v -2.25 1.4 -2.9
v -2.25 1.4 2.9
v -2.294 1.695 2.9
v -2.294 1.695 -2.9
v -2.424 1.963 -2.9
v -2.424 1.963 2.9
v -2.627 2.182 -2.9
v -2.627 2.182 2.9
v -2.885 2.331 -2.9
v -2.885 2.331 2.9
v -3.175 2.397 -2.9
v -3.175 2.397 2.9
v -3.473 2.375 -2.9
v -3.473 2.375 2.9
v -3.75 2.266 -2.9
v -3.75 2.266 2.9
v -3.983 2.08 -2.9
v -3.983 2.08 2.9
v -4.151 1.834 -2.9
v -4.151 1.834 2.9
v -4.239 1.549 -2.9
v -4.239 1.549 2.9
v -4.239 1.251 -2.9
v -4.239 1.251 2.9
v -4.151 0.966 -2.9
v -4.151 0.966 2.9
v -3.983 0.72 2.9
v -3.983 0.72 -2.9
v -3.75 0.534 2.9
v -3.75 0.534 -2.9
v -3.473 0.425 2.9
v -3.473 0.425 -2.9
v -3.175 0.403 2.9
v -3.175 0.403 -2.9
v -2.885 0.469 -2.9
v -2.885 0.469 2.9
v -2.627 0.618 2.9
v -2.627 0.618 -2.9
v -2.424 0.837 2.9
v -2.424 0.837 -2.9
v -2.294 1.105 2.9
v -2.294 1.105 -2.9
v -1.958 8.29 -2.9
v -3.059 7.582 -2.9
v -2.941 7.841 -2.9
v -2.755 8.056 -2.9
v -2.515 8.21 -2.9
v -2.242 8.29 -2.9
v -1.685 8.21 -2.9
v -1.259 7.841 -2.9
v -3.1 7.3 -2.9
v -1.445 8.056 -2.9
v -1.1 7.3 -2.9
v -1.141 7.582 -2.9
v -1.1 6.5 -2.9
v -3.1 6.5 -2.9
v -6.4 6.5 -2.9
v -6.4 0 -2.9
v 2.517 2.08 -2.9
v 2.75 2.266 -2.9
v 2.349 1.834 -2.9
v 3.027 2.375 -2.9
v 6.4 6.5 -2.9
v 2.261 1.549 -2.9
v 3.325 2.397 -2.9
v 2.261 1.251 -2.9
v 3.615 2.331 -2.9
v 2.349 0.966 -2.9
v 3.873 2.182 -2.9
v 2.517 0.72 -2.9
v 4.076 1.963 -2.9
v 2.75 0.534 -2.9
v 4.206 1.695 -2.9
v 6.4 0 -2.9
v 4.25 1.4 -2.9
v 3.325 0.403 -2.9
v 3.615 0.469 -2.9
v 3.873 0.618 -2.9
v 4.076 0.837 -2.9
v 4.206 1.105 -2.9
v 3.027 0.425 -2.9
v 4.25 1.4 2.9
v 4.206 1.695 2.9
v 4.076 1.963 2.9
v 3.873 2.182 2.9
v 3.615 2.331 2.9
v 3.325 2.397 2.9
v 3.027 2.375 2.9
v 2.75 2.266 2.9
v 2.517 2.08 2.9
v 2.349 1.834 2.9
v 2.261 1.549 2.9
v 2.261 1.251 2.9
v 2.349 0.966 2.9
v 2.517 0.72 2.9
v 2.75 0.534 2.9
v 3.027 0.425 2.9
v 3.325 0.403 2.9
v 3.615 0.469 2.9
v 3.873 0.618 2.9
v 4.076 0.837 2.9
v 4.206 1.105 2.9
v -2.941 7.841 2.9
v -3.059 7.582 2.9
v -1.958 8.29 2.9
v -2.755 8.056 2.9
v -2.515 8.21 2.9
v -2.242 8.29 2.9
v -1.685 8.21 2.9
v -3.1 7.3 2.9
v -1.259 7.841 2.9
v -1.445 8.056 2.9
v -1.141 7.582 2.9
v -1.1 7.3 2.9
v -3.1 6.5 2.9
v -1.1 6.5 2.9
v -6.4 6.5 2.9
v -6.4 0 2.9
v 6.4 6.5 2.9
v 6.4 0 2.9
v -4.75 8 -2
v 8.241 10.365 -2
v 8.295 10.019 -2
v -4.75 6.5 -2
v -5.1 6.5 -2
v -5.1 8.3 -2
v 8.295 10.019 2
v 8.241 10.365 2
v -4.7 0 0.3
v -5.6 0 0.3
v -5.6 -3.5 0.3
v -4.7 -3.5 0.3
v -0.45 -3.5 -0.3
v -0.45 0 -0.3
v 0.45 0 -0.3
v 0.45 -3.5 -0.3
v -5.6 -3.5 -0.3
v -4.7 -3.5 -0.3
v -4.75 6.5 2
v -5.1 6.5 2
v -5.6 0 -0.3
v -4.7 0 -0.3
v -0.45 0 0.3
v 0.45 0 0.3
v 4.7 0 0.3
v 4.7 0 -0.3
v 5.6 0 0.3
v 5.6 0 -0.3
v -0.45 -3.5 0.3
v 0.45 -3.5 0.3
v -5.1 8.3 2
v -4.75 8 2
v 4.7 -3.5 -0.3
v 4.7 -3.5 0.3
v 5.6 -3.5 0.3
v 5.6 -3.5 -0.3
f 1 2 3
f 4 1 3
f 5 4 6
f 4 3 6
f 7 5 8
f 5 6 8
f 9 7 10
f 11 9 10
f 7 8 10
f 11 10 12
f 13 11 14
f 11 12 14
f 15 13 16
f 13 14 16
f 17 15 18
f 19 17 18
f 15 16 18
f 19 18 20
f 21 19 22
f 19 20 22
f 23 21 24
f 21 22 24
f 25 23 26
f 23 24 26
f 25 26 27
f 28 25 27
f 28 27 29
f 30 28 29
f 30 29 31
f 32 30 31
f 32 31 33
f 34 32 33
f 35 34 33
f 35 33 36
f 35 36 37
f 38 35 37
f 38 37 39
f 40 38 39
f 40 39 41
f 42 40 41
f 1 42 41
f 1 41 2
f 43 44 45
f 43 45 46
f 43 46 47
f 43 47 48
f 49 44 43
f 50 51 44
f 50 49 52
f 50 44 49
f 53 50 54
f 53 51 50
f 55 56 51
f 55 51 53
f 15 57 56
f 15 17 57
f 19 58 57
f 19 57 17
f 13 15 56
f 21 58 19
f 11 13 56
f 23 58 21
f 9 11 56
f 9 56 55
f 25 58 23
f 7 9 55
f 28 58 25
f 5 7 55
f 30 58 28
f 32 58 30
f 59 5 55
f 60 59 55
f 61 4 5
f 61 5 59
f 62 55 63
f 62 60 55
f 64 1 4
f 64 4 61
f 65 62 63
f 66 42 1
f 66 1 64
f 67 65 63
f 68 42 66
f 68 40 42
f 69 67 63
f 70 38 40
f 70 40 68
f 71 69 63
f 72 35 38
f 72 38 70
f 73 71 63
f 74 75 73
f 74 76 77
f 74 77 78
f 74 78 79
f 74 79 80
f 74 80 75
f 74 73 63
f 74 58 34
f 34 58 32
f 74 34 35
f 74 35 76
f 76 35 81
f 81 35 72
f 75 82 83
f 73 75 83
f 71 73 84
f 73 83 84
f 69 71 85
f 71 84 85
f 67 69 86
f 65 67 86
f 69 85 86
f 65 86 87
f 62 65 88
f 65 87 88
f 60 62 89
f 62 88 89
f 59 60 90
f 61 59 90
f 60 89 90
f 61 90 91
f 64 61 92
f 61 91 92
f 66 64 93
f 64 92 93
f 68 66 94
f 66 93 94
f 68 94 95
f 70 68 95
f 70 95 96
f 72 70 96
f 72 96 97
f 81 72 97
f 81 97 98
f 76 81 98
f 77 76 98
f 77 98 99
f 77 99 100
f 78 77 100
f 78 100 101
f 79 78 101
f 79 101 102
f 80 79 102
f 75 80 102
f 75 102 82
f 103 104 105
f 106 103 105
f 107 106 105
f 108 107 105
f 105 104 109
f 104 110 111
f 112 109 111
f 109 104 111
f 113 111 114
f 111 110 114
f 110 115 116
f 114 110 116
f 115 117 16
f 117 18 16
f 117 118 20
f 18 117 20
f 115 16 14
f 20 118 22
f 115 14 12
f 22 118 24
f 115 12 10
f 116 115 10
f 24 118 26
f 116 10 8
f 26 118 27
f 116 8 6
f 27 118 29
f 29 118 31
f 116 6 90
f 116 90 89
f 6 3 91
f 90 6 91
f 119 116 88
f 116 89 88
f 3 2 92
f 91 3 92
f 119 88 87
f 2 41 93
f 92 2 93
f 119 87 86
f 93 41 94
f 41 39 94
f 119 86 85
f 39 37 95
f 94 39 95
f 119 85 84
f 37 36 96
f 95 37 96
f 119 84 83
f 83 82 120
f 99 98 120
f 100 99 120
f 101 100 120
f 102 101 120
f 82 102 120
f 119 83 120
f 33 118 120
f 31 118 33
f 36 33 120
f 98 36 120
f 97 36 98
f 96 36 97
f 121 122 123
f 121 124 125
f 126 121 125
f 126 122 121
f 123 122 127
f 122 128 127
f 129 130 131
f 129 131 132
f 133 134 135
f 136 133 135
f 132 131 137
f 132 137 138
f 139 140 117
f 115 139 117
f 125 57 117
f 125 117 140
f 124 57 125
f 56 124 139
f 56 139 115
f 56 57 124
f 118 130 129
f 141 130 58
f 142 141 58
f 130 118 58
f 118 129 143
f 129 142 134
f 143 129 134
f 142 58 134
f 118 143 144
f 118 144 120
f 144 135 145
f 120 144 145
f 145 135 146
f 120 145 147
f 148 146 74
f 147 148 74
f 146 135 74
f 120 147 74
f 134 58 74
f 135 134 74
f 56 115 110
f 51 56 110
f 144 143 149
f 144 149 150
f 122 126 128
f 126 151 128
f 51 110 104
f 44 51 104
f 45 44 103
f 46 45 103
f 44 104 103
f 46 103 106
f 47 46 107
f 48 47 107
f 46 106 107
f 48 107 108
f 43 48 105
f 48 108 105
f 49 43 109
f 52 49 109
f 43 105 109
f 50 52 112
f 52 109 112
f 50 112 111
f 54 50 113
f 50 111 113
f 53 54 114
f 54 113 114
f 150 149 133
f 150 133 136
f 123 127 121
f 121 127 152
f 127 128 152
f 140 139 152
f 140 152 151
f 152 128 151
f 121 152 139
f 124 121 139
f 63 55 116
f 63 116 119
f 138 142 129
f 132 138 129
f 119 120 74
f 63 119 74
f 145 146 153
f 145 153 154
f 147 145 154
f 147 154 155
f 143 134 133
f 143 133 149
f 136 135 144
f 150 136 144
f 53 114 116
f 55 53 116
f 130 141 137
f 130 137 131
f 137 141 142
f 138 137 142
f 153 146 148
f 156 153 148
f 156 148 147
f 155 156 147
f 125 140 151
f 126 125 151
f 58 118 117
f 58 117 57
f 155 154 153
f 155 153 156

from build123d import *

# Parameters (mm, degrees)
SKETCH1_W           = 12.8
SKETCH1_H           = 5.8
BOSS_EXTRUDE1_DEPTH = 6.5
SKETCH2_R           = 1
CUT_EXTRUDE1_DEPTH  = 16.5
SKETCH3_W           = 0.9
SKETCH3_H           = 0.6
BOSS_EXTRUDE2_DEPTH = 3.5
BOSS_EXTRUDE3_DEPTH = 5.8
BOSS_EXTRUDE4_DEPTH = 2


with BuildPart() as part:
    # Sketch1 → Boss-Extrude1 (new body)
    with BuildSketch(Plane(origin=(0, 0, 0), x_dir=(1, 0, 0), z_dir=(0, 1, 0))):
        Rectangle(SKETCH1_W, SKETCH1_H)
    extrude(amount=BOSS_EXTRUDE1_DEPTH)

    # Sketch2 → Cut-Extrude1 (cut)
    with BuildSketch(Plane.XY.offset(2.9)):
        with Locations((-3.25, 1.4)):
            Circle(SKETCH2_R)
        with Locations((3.25, 1.4)):
            Circle(SKETCH2_R)
    extrude(amount=-CUT_EXTRUDE1_DEPTH, mode=Mode.SUBTRACT)

    # Sketch3 → Boss-Extrude2 (add)
    with BuildSketch(Plane.XZ):
        with Locations((-5.15, 0)):
            Rectangle(SKETCH3_W, SKETCH3_H)
        Rectangle(SKETCH3_W, SKETCH3_H)
        with Locations((5.15, 0)):
            Rectangle(SKETCH3_W, SKETCH3_H)
    extrude(amount=BOSS_EXTRUDE2_DEPTH)

    # Sketch4 → Boss-Extrude3 (add)
    with BuildSketch(Plane.XY.offset(2.9)):
        with BuildLine():
            Line((-3.1, 6.5), (-3.1, 7.3))
            ThreePointArc((-3.1, 7.3), (-2.1, 8.3), (-1.1, 7.3))
            Line((-1.1, 7.3), (-1.1, 6.5))
            Line((-1.1, 6.5), (-3.1, 6.5))
        make_face()
    extrude(amount=-BOSS_EXTRUDE3_DEPTH)

    # Sketch5 → Boss-Extrude4 (add, symmetric)
    with BuildSketch(Plane.XY):
        Polygon((-5.1, 6.5), (-5.1, 8.3), (8.241176471, 10.364705882), (8.294705882, 10.018823529), (-4.75, 8), (-4.75, 6.5), align=None)
    extrude(amount=BOSS_EXTRUDE4_DEPTH, both=True)


solid = part.part
